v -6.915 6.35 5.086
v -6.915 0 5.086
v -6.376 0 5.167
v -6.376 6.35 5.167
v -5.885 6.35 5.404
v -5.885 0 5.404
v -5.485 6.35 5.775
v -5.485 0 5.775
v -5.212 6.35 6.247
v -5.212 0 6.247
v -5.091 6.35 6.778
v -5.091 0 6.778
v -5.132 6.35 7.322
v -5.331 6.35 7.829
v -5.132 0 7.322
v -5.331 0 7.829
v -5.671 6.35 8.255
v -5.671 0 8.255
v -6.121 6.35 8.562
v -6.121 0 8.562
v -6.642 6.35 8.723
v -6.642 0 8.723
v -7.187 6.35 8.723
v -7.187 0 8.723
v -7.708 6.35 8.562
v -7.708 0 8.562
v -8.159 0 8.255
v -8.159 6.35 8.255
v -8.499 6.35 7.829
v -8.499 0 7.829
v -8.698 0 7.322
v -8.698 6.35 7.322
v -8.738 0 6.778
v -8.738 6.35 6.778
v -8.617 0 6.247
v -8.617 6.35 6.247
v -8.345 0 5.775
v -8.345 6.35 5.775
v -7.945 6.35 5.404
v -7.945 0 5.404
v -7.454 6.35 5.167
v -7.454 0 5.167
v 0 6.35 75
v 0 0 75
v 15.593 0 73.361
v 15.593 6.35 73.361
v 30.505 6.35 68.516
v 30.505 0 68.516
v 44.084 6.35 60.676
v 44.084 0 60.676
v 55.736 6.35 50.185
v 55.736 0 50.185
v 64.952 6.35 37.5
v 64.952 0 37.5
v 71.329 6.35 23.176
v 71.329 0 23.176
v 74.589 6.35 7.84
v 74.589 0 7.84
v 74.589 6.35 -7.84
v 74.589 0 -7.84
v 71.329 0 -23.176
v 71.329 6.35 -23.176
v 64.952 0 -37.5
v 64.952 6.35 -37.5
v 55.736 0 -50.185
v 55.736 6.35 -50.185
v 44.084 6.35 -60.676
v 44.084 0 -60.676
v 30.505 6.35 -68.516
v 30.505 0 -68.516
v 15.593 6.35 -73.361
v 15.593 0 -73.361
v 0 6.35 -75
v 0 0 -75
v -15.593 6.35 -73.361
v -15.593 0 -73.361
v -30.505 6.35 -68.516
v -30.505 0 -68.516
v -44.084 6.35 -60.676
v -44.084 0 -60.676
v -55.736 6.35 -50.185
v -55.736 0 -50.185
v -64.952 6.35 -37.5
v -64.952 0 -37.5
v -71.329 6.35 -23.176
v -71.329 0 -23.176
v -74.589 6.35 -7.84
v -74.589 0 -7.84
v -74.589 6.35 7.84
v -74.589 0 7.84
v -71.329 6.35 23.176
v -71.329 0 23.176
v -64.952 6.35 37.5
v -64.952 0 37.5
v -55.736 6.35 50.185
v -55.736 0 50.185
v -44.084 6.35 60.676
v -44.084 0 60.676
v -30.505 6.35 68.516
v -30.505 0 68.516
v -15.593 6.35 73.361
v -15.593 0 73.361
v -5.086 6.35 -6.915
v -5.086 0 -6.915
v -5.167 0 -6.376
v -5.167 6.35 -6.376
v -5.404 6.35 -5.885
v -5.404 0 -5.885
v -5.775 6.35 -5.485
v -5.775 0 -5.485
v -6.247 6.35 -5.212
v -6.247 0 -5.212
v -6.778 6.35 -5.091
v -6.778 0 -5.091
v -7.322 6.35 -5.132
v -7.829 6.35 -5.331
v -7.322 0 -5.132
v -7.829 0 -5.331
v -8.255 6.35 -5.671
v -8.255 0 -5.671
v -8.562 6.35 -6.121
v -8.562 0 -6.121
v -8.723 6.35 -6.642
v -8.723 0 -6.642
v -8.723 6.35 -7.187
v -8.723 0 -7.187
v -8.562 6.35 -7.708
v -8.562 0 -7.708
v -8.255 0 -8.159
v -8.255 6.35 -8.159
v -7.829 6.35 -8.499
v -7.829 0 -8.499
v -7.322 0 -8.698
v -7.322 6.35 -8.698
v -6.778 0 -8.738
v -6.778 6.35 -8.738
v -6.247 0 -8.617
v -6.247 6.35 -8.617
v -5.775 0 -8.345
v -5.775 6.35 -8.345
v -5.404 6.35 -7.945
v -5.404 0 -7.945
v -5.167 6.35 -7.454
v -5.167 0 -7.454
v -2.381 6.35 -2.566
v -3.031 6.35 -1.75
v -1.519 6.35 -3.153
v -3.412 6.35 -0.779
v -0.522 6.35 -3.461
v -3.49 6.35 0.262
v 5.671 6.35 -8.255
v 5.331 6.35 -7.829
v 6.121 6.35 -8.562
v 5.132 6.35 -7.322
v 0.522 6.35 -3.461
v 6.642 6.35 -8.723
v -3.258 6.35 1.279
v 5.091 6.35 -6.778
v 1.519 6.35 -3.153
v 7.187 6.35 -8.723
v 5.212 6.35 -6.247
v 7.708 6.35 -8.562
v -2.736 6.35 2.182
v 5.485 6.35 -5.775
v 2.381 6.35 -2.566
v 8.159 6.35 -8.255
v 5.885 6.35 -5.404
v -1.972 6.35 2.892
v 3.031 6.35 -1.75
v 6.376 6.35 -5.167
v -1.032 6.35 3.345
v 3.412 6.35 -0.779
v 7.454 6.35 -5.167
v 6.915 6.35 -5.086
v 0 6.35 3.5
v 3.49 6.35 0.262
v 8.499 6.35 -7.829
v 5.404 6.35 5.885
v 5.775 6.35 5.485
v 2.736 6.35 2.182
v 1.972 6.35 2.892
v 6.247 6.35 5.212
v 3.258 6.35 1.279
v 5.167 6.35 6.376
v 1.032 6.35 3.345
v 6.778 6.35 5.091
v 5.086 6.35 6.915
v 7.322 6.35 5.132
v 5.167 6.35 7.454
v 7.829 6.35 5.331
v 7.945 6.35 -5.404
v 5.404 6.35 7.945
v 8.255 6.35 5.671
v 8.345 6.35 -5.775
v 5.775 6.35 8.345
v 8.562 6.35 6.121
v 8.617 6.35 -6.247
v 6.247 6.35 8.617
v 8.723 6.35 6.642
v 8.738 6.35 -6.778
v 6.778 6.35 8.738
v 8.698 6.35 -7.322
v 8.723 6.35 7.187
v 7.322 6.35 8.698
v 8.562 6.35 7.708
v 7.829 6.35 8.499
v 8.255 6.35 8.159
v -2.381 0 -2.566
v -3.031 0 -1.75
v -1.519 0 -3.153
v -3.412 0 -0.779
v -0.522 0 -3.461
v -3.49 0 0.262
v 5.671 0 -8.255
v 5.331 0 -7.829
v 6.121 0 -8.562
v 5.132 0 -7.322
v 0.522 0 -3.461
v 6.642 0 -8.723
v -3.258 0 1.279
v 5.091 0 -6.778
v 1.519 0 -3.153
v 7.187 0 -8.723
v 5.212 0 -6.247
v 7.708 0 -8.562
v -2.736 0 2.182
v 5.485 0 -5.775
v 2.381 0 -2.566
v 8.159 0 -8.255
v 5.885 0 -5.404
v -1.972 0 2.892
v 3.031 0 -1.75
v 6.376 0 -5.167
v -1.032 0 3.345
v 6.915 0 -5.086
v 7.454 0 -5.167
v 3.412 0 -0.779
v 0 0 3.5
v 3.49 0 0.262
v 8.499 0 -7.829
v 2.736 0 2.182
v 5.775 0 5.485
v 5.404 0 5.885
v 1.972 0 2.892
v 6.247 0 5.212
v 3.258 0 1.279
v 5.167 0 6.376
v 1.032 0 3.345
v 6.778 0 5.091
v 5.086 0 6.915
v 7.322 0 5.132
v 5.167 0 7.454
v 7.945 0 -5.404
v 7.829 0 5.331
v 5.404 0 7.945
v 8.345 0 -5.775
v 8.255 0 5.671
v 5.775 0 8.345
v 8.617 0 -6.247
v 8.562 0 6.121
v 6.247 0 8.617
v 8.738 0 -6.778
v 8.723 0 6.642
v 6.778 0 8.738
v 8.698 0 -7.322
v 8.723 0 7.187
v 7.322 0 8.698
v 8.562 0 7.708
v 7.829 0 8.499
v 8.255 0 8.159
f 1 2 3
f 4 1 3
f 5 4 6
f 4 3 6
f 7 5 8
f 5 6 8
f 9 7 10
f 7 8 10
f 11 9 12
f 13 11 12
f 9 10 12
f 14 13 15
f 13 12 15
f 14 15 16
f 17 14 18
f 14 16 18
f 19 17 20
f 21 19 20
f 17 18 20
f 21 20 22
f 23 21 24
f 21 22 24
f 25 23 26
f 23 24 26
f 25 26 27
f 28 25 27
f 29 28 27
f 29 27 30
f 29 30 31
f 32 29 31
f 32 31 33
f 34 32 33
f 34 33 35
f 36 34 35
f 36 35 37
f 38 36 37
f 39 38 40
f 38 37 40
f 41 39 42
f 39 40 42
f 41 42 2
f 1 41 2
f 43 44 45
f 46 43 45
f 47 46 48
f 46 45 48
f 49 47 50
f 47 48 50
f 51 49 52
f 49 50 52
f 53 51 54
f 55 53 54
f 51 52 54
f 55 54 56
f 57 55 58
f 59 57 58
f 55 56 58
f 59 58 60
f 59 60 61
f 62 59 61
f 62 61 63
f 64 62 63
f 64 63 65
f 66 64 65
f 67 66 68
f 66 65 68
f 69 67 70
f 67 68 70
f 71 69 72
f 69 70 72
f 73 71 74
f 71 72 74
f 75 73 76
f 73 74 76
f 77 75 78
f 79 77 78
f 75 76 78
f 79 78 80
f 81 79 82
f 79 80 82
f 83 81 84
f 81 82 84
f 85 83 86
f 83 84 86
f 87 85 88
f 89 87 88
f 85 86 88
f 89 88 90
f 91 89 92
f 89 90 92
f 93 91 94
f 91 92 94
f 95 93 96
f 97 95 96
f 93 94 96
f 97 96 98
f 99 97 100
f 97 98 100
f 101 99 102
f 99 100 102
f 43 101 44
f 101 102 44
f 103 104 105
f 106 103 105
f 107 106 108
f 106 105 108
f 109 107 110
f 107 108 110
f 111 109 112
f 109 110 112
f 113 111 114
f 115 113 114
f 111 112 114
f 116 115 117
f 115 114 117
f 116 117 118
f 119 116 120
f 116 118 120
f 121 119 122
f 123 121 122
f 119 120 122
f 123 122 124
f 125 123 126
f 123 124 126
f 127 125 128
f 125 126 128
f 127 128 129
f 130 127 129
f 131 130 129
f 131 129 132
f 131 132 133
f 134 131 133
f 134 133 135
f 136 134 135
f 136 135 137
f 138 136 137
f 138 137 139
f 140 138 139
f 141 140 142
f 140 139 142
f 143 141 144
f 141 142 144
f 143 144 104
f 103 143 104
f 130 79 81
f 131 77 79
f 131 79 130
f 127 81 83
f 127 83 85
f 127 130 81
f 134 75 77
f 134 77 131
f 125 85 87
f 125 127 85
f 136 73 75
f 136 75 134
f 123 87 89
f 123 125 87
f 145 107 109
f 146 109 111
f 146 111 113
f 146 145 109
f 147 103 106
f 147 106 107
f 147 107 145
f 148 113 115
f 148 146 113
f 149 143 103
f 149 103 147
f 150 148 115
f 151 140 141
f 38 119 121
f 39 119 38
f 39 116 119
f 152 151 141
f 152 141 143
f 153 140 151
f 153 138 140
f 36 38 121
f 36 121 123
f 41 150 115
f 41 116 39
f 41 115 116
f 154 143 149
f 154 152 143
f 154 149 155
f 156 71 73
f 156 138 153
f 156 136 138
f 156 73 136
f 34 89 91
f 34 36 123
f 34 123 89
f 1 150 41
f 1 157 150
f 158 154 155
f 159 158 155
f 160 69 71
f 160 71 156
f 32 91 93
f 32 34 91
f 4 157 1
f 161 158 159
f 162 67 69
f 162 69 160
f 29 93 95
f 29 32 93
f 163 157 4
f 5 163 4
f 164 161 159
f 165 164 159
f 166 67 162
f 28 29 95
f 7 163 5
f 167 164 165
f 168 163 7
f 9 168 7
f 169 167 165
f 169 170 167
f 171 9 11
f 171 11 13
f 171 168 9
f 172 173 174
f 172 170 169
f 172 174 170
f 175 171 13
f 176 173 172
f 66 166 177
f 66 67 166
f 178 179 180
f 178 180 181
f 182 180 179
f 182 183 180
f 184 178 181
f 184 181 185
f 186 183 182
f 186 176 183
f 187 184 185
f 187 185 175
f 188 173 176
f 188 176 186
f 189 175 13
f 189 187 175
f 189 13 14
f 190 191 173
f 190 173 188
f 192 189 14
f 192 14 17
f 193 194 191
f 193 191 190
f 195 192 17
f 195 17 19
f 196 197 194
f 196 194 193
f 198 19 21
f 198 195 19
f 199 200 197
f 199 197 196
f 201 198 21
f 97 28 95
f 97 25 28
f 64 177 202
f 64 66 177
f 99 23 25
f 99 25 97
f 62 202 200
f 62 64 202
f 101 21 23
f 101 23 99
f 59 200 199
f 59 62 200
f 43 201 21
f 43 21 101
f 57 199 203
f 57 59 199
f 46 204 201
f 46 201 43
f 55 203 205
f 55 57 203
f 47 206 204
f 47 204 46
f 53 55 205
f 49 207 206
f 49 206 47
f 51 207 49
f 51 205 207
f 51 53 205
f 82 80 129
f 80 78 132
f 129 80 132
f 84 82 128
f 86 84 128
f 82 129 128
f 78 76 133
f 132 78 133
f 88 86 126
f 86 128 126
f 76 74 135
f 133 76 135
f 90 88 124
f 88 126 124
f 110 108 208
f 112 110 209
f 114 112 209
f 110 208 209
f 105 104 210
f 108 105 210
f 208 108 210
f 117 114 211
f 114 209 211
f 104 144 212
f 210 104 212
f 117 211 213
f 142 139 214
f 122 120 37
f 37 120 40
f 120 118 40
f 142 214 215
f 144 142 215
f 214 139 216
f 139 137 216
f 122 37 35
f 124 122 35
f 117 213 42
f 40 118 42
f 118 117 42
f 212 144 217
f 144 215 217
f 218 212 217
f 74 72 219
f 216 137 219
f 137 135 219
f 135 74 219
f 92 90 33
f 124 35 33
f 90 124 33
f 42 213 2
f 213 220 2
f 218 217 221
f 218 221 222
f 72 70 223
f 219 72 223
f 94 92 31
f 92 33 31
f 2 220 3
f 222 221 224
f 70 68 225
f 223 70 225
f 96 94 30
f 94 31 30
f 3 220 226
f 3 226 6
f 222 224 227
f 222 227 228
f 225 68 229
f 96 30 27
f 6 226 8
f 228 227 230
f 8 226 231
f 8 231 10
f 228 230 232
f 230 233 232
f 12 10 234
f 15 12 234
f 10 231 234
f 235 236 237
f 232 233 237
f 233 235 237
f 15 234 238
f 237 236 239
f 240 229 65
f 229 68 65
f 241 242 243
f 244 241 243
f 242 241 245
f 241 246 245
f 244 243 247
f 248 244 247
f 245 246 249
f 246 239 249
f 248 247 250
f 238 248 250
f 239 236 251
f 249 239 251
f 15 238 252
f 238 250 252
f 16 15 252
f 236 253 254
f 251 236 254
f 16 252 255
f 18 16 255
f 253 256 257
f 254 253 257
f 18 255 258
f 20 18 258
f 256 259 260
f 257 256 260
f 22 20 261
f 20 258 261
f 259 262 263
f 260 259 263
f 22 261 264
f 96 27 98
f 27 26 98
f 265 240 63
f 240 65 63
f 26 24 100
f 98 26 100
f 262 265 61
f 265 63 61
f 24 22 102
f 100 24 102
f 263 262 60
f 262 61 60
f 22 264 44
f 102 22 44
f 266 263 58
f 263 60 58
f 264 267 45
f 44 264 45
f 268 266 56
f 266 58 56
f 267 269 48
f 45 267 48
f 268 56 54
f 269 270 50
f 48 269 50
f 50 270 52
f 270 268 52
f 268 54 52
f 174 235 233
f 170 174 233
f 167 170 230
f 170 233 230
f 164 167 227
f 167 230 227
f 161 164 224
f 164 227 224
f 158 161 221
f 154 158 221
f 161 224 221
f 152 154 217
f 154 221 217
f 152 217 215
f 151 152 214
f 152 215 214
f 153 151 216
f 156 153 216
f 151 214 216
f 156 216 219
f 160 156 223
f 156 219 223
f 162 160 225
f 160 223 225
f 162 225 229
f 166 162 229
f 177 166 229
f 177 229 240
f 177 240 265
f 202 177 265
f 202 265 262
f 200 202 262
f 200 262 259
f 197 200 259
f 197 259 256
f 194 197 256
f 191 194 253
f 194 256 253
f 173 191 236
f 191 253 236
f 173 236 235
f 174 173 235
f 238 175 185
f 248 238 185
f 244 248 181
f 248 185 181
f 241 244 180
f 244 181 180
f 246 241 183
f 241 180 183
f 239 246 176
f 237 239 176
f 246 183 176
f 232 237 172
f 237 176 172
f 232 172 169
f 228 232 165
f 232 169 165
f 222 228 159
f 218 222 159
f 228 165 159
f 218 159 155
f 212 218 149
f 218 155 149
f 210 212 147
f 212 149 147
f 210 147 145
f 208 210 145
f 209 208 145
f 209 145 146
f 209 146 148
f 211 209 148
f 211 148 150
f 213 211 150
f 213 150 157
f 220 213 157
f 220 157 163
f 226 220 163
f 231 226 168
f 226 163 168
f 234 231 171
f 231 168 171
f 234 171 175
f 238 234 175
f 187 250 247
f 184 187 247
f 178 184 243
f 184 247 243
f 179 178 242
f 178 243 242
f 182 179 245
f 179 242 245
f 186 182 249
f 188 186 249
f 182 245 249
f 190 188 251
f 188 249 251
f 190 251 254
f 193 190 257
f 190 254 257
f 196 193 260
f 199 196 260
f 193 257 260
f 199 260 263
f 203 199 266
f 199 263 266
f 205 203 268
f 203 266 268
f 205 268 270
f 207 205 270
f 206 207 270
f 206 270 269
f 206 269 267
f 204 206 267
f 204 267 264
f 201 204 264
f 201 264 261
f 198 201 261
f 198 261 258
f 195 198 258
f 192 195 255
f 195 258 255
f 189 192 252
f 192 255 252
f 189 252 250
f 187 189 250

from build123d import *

# Parameters (mm, degrees)
ESQUISSE1_R             = 75
BOSS_EXTRU_1_DEPTH      = 6.35
ESQUISSE2_R             = 3.5
ENL_V_MAT_EXTRU_1_DEPTH = 6.35
SKETCH1_R               = 1.8288
CUT_EXTRUDE1_DEPTH      = 6.35
CIRPATTERN1_COUNT       = 4


with BuildPart() as part:
    # Esquisse1 → Boss.-Extru.1 (new body)
    with BuildSketch(Plane(origin=(0, 0, 0), x_dir=(1, 0, 0), z_dir=(0, 1, 0))):
        with Locations(Location((0, 0, 0), (0, 0, 270))):
            Circle(ESQUISSE1_R)
    extrude(amount=BOSS_EXTRU_1_DEPTH)

    # Esquisse2 → Enlèv. mat.-Extru.1 (cut)
    with BuildSketch(Plane(origin=(0, 6.35, 0), x_dir=(1, 0, 0), z_dir=(0, 1, 0))):
        with Locations(Location((0, 0, 0), (0, 0, 270))):
            Circle(ESQUISSE2_R)
    extrude(amount=-ENL_V_MAT_EXTRU_1_DEPTH, mode=Mode.SUBTRACT)

    # Sketch1 → Cut-Extrude1 (cut)
    with BuildSketch(Plane.XZ):
        with Locations(Location((-6.914797213, 6.914797213, 0), (0, 0, 270))):
            Circle(SKETCH1_R)
    cut_extrude1 = extrude(amount=-CUT_EXTRUDE1_DEPTH, mode=Mode.SUBTRACT)

    # CirPattern1: Cut-Extrude1 ×4 about axis
    cirpattern1_axis = Axis((0, 0, 0), (0, 1, 0))
    for i in range(1, CIRPATTERN1_COUNT):
        add(cut_extrude1.rotate(cirpattern1_axis, i * 360 / CIRPATTERN1_COUNT), mode=Mode.SUBTRACT)


solid = part.part
